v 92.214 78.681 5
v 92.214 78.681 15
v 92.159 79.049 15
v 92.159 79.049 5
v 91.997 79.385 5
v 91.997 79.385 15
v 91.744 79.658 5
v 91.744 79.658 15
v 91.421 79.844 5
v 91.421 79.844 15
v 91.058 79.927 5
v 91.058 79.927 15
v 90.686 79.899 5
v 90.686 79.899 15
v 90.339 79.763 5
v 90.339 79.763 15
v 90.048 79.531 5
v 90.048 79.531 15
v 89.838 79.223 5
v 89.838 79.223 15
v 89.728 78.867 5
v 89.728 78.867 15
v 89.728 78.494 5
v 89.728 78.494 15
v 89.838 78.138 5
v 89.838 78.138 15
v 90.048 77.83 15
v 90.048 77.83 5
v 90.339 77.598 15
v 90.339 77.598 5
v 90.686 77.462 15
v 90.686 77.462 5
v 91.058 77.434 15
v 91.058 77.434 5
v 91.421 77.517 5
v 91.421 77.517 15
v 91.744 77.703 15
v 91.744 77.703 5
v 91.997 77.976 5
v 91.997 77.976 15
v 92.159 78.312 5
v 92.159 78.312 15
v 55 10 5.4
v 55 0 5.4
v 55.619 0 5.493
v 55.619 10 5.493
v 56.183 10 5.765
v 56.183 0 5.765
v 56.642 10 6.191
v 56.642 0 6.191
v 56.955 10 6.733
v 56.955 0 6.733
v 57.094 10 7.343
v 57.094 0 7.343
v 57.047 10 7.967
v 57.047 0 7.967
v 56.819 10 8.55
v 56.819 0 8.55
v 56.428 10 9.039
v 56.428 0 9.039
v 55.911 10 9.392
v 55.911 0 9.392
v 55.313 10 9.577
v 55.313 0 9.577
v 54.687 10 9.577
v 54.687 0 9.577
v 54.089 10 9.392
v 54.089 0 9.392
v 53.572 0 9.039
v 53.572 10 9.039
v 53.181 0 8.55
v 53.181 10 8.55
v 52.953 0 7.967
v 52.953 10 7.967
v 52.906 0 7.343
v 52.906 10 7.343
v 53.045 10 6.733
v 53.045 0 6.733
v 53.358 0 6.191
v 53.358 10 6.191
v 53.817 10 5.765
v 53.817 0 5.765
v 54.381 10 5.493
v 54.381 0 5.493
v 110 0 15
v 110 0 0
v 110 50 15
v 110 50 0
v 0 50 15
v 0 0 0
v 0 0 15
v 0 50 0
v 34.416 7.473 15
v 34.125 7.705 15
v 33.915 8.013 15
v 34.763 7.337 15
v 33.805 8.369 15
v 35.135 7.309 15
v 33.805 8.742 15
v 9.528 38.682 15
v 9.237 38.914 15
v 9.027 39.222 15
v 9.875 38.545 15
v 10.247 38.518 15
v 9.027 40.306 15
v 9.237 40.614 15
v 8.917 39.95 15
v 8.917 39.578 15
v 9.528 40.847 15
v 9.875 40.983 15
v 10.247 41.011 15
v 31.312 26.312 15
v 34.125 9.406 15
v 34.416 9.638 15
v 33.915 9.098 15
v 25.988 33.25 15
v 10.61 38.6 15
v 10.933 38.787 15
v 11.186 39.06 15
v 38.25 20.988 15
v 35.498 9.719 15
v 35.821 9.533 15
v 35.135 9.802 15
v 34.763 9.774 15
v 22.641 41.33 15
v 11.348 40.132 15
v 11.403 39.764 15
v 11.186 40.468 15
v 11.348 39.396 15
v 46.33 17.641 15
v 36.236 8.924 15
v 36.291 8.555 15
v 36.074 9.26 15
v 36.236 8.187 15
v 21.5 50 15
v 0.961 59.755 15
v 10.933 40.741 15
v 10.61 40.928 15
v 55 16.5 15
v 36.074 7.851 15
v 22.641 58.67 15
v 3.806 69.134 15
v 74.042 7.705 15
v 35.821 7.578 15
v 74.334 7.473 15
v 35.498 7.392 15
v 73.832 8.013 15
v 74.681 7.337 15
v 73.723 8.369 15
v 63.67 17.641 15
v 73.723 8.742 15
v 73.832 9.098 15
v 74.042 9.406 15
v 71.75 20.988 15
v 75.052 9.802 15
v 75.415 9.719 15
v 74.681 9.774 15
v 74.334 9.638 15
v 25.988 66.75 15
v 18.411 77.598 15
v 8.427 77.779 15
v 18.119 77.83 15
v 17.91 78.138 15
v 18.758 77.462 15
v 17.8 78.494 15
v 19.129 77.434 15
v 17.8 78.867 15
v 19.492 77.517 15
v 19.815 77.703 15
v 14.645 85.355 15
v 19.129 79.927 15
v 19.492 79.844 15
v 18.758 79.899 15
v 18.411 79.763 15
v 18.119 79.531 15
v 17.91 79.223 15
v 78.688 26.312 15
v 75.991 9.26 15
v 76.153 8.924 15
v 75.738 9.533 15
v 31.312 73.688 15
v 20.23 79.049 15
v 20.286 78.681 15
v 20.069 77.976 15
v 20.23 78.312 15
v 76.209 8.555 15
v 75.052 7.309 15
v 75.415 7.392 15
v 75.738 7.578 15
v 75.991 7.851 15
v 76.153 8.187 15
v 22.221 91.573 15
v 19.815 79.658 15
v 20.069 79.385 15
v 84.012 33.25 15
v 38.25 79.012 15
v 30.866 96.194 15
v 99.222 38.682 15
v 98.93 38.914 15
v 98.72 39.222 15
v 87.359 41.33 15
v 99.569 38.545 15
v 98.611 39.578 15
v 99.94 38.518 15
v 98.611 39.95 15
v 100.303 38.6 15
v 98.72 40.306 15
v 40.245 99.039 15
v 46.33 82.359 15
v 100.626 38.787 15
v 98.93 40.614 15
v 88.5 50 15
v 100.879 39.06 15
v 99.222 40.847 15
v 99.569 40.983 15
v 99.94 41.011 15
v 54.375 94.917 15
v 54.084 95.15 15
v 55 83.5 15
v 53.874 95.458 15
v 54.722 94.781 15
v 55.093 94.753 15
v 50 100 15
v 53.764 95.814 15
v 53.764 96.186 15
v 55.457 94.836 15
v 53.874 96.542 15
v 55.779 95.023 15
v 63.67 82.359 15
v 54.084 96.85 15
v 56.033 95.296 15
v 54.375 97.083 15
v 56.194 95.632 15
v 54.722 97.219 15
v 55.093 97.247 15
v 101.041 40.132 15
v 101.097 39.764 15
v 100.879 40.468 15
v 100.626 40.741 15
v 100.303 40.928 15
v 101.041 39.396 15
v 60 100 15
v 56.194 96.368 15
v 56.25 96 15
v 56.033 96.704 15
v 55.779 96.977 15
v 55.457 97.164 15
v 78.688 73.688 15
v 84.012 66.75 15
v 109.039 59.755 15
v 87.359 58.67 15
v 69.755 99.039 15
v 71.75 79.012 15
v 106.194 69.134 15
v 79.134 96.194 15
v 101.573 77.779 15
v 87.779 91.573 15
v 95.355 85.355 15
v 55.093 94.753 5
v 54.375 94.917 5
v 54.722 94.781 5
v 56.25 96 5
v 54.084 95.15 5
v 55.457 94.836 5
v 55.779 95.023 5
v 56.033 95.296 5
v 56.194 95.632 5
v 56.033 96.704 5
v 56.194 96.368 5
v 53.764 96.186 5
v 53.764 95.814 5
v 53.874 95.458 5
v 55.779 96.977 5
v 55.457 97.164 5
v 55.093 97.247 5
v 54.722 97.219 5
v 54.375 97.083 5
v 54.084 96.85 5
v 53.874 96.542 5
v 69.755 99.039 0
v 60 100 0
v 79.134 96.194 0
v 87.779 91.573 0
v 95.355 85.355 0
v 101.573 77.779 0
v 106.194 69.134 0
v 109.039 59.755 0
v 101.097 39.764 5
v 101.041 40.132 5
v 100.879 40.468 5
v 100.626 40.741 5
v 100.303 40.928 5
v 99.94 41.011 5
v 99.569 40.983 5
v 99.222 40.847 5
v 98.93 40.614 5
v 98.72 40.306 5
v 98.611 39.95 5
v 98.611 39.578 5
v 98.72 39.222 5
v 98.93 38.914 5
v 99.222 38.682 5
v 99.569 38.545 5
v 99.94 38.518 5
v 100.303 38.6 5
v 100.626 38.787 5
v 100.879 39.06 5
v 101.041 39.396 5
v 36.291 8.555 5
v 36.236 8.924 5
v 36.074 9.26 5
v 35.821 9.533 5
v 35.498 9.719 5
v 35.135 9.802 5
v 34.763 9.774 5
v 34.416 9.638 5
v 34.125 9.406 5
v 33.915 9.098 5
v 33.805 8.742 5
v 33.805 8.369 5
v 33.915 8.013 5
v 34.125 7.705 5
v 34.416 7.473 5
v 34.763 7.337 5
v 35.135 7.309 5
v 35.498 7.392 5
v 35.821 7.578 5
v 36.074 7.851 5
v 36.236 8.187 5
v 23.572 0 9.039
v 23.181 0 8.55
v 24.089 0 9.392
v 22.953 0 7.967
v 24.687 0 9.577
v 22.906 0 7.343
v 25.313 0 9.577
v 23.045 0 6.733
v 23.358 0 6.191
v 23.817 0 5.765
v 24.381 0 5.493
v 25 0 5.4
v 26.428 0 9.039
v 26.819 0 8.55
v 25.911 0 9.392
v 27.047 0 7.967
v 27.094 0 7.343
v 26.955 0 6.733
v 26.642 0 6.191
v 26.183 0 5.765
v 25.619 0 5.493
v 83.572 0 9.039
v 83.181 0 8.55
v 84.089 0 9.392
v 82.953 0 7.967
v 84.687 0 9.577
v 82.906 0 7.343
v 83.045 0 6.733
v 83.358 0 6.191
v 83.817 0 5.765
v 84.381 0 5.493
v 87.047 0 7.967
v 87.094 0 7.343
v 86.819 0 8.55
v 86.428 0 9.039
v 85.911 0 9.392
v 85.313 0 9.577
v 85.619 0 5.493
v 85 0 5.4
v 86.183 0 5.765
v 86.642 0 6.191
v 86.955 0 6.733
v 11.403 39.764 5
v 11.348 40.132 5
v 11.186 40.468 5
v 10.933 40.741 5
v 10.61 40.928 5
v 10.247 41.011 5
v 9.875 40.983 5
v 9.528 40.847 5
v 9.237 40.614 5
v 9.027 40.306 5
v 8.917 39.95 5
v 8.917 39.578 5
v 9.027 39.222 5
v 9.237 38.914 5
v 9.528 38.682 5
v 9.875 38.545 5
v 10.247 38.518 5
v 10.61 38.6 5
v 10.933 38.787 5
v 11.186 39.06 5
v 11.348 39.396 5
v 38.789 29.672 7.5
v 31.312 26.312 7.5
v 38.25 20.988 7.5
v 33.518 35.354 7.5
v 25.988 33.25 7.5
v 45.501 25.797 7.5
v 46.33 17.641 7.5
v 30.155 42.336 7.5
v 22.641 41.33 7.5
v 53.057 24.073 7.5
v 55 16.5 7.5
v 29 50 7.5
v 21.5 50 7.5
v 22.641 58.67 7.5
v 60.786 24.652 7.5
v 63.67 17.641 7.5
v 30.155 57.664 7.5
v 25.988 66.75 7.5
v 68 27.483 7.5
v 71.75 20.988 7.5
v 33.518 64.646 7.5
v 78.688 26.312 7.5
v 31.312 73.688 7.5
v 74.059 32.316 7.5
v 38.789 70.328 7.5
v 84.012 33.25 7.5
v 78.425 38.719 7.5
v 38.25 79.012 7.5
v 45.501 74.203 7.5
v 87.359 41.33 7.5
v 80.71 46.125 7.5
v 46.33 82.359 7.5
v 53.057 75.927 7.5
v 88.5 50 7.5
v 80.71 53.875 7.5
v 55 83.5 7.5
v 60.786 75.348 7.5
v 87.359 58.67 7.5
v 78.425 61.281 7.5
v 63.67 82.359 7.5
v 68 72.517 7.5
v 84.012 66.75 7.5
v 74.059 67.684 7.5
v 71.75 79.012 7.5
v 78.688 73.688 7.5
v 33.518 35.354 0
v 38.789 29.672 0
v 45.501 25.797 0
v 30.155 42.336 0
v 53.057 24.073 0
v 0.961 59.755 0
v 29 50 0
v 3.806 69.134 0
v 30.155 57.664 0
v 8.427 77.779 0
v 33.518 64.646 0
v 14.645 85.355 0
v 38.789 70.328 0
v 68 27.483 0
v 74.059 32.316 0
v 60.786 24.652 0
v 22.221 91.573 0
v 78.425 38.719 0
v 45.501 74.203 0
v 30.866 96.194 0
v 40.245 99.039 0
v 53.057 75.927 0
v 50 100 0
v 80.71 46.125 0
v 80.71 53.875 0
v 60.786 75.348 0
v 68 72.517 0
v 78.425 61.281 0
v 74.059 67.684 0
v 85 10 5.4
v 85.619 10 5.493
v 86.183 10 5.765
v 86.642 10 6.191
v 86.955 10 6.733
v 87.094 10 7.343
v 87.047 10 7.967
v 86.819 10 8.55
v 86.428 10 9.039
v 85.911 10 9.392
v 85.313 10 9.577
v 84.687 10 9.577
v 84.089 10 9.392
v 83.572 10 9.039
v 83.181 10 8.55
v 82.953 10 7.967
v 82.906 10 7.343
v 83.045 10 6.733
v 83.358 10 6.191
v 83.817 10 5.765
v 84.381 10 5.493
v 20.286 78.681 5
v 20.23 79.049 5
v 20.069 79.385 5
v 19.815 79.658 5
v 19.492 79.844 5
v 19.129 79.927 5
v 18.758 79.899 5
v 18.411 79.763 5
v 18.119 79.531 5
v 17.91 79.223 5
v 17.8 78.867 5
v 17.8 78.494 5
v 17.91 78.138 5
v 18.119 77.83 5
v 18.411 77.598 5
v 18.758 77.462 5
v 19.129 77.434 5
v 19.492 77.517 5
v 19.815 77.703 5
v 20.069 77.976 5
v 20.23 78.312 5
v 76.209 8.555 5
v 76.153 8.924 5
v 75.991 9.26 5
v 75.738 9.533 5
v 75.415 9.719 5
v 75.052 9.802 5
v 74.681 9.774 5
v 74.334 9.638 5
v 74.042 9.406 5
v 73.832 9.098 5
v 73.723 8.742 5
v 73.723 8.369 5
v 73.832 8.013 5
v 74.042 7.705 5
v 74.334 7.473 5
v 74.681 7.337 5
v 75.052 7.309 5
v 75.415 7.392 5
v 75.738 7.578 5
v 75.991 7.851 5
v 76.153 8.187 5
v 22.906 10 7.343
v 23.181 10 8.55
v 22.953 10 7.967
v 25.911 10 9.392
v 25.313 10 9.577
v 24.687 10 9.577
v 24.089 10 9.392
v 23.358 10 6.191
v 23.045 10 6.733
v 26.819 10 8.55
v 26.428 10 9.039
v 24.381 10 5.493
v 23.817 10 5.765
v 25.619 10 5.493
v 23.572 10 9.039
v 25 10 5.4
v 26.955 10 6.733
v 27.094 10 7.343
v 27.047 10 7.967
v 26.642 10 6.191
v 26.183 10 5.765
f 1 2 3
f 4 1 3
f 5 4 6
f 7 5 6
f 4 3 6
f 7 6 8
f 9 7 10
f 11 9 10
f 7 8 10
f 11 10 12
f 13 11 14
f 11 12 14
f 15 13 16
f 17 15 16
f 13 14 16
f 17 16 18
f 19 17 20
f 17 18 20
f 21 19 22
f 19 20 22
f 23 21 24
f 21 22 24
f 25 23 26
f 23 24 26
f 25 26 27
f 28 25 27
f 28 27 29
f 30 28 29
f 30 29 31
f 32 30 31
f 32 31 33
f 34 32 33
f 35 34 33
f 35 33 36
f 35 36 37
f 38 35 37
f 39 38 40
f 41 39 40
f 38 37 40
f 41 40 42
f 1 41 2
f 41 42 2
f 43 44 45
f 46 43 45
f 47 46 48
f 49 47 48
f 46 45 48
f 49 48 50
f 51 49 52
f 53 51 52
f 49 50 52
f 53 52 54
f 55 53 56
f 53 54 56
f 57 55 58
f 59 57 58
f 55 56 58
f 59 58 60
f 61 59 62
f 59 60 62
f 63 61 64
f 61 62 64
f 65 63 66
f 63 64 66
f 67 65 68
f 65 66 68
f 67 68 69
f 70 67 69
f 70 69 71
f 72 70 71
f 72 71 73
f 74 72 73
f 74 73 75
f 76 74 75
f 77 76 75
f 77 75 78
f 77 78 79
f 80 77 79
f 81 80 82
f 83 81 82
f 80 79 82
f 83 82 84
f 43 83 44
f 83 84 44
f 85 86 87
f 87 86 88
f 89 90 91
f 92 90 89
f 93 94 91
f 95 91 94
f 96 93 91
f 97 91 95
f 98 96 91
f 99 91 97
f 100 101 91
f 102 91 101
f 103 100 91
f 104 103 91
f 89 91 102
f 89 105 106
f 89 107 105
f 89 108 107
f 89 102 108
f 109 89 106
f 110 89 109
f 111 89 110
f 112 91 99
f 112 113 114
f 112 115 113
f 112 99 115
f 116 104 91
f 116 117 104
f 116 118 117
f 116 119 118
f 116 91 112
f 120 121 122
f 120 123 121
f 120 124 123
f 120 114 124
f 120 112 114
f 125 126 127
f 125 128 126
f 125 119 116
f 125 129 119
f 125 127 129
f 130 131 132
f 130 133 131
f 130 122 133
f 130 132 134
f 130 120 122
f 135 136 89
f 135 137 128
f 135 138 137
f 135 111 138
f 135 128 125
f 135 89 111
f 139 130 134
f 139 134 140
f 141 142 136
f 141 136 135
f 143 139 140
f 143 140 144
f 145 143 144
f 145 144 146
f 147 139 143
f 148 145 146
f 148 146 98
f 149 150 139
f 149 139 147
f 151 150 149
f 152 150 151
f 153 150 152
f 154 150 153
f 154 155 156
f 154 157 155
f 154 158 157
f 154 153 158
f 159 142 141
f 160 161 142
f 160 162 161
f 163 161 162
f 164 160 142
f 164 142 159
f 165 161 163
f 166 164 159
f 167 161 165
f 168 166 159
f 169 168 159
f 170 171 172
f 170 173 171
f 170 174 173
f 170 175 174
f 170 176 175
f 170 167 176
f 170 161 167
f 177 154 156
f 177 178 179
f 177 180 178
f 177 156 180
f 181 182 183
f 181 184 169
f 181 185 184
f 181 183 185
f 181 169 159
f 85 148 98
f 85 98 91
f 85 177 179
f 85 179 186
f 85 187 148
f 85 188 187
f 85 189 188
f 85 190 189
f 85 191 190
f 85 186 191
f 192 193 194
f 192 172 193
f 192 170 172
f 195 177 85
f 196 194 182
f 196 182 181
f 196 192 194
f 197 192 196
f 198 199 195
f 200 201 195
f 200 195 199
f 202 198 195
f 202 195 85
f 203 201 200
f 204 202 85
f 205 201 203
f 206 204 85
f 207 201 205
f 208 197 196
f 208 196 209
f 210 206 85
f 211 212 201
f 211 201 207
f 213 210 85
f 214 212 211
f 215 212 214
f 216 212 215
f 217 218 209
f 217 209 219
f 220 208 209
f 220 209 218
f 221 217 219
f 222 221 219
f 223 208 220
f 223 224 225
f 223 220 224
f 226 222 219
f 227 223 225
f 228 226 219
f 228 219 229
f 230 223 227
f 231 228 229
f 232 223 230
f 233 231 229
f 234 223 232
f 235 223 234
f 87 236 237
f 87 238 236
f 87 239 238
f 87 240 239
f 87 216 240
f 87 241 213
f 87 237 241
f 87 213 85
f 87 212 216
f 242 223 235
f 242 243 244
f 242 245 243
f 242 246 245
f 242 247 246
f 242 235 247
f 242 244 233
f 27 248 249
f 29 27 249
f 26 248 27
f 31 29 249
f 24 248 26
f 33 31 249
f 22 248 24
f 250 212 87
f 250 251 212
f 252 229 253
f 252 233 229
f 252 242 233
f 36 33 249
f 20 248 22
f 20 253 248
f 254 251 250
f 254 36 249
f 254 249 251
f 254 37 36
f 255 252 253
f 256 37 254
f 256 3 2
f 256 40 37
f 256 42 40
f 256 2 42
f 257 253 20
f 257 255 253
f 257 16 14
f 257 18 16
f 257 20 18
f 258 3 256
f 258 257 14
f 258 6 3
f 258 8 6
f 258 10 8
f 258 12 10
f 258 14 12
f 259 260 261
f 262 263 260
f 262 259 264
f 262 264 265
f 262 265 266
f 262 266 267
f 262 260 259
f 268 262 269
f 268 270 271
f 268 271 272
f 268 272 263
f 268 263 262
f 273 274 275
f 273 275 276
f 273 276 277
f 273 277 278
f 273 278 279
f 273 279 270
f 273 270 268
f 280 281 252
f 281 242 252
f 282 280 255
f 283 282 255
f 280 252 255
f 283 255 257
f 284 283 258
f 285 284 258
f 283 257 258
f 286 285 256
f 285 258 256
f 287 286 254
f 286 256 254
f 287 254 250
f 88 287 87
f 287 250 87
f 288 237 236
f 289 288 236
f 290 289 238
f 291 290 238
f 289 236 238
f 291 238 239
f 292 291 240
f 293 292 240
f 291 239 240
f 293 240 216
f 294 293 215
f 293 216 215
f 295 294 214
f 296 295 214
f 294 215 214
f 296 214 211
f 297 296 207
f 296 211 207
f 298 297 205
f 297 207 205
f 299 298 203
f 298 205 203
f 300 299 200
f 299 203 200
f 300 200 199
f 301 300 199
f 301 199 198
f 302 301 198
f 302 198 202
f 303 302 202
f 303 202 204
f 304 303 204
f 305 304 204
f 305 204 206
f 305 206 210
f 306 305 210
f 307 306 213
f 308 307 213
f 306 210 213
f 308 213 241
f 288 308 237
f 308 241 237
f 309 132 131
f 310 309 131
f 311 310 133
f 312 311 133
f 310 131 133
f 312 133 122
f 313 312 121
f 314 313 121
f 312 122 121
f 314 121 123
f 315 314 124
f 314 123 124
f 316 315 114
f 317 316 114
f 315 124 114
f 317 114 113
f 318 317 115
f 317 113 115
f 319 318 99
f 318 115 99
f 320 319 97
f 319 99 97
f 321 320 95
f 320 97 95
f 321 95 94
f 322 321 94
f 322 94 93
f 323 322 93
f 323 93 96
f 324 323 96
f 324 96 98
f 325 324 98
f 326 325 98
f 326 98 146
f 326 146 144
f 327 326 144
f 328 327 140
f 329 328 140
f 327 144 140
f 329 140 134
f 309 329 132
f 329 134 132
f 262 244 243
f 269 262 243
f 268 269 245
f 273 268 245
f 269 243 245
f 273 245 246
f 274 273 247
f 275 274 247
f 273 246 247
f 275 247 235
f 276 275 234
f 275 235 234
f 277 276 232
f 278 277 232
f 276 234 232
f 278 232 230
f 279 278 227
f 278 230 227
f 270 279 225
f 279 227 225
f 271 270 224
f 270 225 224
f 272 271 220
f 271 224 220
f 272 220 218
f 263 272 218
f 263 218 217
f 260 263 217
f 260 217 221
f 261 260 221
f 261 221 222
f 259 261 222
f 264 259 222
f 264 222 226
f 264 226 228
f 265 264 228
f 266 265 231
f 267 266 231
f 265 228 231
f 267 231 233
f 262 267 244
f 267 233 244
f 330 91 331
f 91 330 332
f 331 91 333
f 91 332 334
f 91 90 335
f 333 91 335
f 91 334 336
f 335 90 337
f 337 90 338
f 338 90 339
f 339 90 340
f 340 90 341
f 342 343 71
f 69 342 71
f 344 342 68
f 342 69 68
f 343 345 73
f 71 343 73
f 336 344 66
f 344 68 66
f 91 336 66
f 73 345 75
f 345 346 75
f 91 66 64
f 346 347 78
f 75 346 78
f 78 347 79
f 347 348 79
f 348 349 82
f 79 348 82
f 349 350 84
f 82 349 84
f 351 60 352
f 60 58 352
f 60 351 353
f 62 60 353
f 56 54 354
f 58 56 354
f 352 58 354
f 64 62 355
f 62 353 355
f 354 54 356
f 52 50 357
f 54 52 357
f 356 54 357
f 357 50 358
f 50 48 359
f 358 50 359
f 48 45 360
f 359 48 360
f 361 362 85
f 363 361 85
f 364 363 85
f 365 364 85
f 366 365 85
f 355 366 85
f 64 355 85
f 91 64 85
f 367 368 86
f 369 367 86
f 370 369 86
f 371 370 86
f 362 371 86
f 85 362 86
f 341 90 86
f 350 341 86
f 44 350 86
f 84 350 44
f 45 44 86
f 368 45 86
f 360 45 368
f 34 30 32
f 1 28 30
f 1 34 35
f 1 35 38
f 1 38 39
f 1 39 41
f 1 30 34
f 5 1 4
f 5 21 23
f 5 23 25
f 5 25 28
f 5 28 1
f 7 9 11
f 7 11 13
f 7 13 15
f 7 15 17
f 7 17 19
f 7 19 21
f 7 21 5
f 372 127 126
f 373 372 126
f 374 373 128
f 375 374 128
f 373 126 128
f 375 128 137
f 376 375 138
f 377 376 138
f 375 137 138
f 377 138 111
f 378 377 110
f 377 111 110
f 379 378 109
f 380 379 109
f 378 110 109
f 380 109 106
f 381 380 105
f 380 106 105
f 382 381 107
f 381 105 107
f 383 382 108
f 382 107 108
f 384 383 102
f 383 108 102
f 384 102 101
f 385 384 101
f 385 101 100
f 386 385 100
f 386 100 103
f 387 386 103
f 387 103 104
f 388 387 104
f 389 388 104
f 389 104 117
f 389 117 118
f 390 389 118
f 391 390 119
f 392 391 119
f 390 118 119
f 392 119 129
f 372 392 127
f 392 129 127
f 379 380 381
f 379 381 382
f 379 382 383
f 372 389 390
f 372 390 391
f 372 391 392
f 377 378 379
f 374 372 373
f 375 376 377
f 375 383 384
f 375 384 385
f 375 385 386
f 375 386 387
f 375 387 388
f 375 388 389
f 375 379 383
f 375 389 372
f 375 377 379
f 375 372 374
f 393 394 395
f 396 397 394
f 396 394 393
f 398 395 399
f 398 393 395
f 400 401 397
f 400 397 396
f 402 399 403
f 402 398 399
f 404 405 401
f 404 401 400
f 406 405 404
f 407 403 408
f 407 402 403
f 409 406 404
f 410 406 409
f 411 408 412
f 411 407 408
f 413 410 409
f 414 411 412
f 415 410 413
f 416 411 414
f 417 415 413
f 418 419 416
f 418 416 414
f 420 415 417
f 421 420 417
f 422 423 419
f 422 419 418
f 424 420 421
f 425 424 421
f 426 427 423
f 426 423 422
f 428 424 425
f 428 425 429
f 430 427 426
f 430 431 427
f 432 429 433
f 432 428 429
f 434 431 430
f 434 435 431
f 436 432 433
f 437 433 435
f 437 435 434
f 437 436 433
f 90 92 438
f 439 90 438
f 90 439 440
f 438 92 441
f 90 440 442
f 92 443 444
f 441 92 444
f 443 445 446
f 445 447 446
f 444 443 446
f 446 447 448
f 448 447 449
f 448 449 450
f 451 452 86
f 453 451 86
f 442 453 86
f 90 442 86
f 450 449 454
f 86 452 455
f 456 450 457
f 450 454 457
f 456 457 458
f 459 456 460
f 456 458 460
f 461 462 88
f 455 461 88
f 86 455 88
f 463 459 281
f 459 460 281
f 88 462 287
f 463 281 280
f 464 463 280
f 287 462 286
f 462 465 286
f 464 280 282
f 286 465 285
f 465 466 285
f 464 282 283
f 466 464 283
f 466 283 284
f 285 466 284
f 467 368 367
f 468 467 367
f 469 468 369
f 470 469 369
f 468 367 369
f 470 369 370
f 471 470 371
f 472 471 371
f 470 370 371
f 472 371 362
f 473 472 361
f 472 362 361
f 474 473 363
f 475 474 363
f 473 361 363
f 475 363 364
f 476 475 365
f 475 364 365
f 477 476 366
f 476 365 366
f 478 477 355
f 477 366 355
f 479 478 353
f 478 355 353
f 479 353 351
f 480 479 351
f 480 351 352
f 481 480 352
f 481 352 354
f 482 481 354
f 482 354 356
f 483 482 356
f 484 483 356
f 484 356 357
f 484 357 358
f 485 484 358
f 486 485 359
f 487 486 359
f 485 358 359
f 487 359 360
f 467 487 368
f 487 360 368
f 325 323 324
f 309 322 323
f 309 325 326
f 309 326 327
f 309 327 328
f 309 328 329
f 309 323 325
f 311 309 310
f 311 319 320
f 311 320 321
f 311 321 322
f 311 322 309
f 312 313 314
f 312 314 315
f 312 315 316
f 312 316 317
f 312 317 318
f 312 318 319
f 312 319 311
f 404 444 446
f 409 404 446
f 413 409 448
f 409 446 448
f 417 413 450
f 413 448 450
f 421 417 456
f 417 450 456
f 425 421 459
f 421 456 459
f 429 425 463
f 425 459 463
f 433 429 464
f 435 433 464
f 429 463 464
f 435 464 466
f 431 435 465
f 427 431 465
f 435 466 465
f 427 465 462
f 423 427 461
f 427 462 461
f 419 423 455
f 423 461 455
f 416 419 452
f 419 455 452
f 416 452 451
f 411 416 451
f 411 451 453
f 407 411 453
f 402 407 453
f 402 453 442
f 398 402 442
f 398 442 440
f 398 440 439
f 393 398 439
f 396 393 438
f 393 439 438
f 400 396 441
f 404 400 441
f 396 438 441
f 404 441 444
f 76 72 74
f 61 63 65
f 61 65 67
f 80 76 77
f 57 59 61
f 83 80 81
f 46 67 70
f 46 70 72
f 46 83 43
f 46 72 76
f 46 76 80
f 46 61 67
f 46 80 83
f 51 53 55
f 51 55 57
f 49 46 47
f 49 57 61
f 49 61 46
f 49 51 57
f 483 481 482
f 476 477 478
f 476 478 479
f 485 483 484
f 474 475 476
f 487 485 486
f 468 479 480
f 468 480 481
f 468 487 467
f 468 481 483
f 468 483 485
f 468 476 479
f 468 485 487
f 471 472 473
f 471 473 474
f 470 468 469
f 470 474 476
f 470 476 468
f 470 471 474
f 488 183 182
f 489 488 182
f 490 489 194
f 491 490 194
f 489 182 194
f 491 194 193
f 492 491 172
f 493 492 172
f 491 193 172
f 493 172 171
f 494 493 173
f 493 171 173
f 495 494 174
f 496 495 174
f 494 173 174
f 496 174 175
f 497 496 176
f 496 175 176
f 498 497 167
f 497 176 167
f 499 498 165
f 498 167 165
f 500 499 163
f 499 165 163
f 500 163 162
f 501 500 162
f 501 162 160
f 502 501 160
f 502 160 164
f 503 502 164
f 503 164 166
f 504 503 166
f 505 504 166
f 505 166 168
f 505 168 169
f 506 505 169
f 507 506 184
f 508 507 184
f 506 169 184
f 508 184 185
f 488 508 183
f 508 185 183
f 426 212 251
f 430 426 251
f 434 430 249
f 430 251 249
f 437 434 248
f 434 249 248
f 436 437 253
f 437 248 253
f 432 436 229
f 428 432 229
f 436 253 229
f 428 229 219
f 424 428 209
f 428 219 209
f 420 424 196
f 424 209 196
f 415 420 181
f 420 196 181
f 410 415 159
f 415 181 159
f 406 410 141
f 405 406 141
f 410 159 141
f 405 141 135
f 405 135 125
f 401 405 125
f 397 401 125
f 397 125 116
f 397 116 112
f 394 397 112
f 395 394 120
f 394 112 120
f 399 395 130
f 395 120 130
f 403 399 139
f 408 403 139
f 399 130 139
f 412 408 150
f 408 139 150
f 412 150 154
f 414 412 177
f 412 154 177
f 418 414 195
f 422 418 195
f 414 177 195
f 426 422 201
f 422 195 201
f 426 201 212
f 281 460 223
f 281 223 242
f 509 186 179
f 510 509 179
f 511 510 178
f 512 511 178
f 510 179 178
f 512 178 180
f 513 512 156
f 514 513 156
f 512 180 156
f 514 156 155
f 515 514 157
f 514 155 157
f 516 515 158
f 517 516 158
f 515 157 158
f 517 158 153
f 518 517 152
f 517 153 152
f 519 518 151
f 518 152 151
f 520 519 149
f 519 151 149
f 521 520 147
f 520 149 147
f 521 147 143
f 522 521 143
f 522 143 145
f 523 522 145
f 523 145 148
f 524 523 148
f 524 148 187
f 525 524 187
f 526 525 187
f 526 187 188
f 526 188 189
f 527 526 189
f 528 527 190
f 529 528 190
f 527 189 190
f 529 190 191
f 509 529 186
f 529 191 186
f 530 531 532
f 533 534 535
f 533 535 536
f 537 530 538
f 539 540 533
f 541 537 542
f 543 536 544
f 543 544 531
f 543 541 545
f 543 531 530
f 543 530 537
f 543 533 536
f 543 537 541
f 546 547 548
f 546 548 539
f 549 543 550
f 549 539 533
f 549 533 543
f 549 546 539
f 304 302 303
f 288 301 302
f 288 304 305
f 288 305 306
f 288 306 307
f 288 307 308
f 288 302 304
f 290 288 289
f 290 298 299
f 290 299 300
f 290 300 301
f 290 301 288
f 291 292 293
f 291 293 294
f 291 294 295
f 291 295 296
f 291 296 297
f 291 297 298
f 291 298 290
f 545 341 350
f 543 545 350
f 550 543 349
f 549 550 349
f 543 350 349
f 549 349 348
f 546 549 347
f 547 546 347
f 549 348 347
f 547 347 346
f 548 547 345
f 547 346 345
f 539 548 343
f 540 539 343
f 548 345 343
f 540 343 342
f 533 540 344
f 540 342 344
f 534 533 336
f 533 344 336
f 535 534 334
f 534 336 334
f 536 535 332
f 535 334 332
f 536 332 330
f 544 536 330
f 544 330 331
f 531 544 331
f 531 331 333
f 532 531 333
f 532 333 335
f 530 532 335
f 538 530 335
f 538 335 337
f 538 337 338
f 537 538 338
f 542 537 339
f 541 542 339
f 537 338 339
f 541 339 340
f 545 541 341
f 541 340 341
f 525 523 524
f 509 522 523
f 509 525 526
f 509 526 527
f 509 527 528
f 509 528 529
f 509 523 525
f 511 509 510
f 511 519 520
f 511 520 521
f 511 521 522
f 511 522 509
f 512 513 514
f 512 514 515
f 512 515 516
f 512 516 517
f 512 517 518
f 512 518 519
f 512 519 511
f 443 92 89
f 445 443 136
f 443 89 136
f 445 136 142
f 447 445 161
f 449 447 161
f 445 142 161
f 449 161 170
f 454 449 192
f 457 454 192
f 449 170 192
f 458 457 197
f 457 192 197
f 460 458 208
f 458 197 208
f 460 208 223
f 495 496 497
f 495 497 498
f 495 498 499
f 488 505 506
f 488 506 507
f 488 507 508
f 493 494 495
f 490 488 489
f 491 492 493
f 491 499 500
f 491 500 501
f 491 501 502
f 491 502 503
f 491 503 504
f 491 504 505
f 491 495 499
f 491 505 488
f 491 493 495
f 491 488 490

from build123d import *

# Parameters (mm, degrees)
SKIZZE1_W                       = 110
SKIZZE1_H                       = 100
AUFSATZ_LINEAR_AUSTRAGEN1_DEPTH = 15
SKIZZE2_R                       = 33.5
SCHNITT_LINEAR_AUSTRAGEN1_DEPTH = 7.5
SKIZZE3_R                       = 26
SCHNITT_LINEAR_AUSTRAGEN2_DEPTH = 7.5
SKIZZE4_R                       = 2.1
SCHNITT_LINEAR_AUSTRAGEN3_DEPTH = 10
SKIZZE5_R                       = 1.25
SCHNITT_LINEAR_AUSTRAGEN5_DEPTH = 10
VERRUNDUNG1_R                   = 50


with BuildPart() as part:
    # Skizze1 → Aufsatz-Linear austragen1 (new body)
    with BuildSketch(Plane.XY):
        with Locations((55, 50)):
            Rectangle(SKIZZE1_W, SKIZZE1_H)
    extrude(amount=AUFSATZ_LINEAR_AUSTRAGEN1_DEPTH)

    # Skizze2 → Schnitt-Linear austragen1 (cut)
    with BuildSketch(Plane.XY.offset(15)):
        with Locations((55, 50)):
            Circle(SKIZZE2_R)
    extrude(amount=-SCHNITT_LINEAR_AUSTRAGEN1_DEPTH, mode=Mode.SUBTRACT)

    # Skizze3 → Schnitt-Linear austragen2 (cut)
    with BuildSketch(Plane(origin=(0, 0, 0), x_dir=(-1, 0, 0), z_dir=(0, 0, -1))):
        with Locations((-55, 50)):
            Circle(SKIZZE3_R)
    extrude(amount=-SCHNITT_LINEAR_AUSTRAGEN2_DEPTH, mode=Mode.SUBTRACT)

    # Skizze4 → Schnitt-Linear austragen3 (cut)
    with BuildSketch(Plane.XZ):
        with Locations(Location((25, 7.5, 0), (0, 0, 270))):
            Circle(SKIZZE4_R)
        with Locations(Location((85, 7.5, 0), (0, 0, 270))):
            Circle(SKIZZE4_R)
        with Locations(Location((55, 7.5, 0), (0, 0, 270))):
            Circle(SKIZZE4_R)
    extrude(amount=-SCHNITT_LINEAR_AUSTRAGEN3_DEPTH, mode=Mode.SUBTRACT)

    # Skizze5 → Schnitt-Linear austragen5 (cut)
    with BuildSketch(Plane.XY.offset(15)):
        with Locations((55, 96)):
            Circle(SKIZZE5_R)
        with Locations((90.964248194, 78.680530886)):
            Circle(SKIZZE5_R)
        with Locations((99.84668396, 39.764037038)):
            Circle(SKIZZE5_R)
        with Locations((74.958651999, 8.555432076)):
            Circle(SKIZZE5_R)
        with Locations((35.041348001, 8.555432076)):
            Circle(SKIZZE5_R)
        with Locations((10.15331604, 39.764037038)):
            Circle(SKIZZE5_R)
        with Locations((19.035751806, 78.680530886)):
            Circle(SKIZZE5_R)
    extrude(amount=-SCHNITT_LINEAR_AUSTRAGEN5_DEPTH, mode=Mode.SUBTRACT)

    # Verrundung1
    verrundung1_edges = [part.edges().sort_by_distance(p)[0] for p in [
        (0, 100, 7.5),
        (110, 100, 7.5),
    ]]
    fillet(verrundung1_edges, radius=VERRUNDUNG1_R)


solid = part.part
